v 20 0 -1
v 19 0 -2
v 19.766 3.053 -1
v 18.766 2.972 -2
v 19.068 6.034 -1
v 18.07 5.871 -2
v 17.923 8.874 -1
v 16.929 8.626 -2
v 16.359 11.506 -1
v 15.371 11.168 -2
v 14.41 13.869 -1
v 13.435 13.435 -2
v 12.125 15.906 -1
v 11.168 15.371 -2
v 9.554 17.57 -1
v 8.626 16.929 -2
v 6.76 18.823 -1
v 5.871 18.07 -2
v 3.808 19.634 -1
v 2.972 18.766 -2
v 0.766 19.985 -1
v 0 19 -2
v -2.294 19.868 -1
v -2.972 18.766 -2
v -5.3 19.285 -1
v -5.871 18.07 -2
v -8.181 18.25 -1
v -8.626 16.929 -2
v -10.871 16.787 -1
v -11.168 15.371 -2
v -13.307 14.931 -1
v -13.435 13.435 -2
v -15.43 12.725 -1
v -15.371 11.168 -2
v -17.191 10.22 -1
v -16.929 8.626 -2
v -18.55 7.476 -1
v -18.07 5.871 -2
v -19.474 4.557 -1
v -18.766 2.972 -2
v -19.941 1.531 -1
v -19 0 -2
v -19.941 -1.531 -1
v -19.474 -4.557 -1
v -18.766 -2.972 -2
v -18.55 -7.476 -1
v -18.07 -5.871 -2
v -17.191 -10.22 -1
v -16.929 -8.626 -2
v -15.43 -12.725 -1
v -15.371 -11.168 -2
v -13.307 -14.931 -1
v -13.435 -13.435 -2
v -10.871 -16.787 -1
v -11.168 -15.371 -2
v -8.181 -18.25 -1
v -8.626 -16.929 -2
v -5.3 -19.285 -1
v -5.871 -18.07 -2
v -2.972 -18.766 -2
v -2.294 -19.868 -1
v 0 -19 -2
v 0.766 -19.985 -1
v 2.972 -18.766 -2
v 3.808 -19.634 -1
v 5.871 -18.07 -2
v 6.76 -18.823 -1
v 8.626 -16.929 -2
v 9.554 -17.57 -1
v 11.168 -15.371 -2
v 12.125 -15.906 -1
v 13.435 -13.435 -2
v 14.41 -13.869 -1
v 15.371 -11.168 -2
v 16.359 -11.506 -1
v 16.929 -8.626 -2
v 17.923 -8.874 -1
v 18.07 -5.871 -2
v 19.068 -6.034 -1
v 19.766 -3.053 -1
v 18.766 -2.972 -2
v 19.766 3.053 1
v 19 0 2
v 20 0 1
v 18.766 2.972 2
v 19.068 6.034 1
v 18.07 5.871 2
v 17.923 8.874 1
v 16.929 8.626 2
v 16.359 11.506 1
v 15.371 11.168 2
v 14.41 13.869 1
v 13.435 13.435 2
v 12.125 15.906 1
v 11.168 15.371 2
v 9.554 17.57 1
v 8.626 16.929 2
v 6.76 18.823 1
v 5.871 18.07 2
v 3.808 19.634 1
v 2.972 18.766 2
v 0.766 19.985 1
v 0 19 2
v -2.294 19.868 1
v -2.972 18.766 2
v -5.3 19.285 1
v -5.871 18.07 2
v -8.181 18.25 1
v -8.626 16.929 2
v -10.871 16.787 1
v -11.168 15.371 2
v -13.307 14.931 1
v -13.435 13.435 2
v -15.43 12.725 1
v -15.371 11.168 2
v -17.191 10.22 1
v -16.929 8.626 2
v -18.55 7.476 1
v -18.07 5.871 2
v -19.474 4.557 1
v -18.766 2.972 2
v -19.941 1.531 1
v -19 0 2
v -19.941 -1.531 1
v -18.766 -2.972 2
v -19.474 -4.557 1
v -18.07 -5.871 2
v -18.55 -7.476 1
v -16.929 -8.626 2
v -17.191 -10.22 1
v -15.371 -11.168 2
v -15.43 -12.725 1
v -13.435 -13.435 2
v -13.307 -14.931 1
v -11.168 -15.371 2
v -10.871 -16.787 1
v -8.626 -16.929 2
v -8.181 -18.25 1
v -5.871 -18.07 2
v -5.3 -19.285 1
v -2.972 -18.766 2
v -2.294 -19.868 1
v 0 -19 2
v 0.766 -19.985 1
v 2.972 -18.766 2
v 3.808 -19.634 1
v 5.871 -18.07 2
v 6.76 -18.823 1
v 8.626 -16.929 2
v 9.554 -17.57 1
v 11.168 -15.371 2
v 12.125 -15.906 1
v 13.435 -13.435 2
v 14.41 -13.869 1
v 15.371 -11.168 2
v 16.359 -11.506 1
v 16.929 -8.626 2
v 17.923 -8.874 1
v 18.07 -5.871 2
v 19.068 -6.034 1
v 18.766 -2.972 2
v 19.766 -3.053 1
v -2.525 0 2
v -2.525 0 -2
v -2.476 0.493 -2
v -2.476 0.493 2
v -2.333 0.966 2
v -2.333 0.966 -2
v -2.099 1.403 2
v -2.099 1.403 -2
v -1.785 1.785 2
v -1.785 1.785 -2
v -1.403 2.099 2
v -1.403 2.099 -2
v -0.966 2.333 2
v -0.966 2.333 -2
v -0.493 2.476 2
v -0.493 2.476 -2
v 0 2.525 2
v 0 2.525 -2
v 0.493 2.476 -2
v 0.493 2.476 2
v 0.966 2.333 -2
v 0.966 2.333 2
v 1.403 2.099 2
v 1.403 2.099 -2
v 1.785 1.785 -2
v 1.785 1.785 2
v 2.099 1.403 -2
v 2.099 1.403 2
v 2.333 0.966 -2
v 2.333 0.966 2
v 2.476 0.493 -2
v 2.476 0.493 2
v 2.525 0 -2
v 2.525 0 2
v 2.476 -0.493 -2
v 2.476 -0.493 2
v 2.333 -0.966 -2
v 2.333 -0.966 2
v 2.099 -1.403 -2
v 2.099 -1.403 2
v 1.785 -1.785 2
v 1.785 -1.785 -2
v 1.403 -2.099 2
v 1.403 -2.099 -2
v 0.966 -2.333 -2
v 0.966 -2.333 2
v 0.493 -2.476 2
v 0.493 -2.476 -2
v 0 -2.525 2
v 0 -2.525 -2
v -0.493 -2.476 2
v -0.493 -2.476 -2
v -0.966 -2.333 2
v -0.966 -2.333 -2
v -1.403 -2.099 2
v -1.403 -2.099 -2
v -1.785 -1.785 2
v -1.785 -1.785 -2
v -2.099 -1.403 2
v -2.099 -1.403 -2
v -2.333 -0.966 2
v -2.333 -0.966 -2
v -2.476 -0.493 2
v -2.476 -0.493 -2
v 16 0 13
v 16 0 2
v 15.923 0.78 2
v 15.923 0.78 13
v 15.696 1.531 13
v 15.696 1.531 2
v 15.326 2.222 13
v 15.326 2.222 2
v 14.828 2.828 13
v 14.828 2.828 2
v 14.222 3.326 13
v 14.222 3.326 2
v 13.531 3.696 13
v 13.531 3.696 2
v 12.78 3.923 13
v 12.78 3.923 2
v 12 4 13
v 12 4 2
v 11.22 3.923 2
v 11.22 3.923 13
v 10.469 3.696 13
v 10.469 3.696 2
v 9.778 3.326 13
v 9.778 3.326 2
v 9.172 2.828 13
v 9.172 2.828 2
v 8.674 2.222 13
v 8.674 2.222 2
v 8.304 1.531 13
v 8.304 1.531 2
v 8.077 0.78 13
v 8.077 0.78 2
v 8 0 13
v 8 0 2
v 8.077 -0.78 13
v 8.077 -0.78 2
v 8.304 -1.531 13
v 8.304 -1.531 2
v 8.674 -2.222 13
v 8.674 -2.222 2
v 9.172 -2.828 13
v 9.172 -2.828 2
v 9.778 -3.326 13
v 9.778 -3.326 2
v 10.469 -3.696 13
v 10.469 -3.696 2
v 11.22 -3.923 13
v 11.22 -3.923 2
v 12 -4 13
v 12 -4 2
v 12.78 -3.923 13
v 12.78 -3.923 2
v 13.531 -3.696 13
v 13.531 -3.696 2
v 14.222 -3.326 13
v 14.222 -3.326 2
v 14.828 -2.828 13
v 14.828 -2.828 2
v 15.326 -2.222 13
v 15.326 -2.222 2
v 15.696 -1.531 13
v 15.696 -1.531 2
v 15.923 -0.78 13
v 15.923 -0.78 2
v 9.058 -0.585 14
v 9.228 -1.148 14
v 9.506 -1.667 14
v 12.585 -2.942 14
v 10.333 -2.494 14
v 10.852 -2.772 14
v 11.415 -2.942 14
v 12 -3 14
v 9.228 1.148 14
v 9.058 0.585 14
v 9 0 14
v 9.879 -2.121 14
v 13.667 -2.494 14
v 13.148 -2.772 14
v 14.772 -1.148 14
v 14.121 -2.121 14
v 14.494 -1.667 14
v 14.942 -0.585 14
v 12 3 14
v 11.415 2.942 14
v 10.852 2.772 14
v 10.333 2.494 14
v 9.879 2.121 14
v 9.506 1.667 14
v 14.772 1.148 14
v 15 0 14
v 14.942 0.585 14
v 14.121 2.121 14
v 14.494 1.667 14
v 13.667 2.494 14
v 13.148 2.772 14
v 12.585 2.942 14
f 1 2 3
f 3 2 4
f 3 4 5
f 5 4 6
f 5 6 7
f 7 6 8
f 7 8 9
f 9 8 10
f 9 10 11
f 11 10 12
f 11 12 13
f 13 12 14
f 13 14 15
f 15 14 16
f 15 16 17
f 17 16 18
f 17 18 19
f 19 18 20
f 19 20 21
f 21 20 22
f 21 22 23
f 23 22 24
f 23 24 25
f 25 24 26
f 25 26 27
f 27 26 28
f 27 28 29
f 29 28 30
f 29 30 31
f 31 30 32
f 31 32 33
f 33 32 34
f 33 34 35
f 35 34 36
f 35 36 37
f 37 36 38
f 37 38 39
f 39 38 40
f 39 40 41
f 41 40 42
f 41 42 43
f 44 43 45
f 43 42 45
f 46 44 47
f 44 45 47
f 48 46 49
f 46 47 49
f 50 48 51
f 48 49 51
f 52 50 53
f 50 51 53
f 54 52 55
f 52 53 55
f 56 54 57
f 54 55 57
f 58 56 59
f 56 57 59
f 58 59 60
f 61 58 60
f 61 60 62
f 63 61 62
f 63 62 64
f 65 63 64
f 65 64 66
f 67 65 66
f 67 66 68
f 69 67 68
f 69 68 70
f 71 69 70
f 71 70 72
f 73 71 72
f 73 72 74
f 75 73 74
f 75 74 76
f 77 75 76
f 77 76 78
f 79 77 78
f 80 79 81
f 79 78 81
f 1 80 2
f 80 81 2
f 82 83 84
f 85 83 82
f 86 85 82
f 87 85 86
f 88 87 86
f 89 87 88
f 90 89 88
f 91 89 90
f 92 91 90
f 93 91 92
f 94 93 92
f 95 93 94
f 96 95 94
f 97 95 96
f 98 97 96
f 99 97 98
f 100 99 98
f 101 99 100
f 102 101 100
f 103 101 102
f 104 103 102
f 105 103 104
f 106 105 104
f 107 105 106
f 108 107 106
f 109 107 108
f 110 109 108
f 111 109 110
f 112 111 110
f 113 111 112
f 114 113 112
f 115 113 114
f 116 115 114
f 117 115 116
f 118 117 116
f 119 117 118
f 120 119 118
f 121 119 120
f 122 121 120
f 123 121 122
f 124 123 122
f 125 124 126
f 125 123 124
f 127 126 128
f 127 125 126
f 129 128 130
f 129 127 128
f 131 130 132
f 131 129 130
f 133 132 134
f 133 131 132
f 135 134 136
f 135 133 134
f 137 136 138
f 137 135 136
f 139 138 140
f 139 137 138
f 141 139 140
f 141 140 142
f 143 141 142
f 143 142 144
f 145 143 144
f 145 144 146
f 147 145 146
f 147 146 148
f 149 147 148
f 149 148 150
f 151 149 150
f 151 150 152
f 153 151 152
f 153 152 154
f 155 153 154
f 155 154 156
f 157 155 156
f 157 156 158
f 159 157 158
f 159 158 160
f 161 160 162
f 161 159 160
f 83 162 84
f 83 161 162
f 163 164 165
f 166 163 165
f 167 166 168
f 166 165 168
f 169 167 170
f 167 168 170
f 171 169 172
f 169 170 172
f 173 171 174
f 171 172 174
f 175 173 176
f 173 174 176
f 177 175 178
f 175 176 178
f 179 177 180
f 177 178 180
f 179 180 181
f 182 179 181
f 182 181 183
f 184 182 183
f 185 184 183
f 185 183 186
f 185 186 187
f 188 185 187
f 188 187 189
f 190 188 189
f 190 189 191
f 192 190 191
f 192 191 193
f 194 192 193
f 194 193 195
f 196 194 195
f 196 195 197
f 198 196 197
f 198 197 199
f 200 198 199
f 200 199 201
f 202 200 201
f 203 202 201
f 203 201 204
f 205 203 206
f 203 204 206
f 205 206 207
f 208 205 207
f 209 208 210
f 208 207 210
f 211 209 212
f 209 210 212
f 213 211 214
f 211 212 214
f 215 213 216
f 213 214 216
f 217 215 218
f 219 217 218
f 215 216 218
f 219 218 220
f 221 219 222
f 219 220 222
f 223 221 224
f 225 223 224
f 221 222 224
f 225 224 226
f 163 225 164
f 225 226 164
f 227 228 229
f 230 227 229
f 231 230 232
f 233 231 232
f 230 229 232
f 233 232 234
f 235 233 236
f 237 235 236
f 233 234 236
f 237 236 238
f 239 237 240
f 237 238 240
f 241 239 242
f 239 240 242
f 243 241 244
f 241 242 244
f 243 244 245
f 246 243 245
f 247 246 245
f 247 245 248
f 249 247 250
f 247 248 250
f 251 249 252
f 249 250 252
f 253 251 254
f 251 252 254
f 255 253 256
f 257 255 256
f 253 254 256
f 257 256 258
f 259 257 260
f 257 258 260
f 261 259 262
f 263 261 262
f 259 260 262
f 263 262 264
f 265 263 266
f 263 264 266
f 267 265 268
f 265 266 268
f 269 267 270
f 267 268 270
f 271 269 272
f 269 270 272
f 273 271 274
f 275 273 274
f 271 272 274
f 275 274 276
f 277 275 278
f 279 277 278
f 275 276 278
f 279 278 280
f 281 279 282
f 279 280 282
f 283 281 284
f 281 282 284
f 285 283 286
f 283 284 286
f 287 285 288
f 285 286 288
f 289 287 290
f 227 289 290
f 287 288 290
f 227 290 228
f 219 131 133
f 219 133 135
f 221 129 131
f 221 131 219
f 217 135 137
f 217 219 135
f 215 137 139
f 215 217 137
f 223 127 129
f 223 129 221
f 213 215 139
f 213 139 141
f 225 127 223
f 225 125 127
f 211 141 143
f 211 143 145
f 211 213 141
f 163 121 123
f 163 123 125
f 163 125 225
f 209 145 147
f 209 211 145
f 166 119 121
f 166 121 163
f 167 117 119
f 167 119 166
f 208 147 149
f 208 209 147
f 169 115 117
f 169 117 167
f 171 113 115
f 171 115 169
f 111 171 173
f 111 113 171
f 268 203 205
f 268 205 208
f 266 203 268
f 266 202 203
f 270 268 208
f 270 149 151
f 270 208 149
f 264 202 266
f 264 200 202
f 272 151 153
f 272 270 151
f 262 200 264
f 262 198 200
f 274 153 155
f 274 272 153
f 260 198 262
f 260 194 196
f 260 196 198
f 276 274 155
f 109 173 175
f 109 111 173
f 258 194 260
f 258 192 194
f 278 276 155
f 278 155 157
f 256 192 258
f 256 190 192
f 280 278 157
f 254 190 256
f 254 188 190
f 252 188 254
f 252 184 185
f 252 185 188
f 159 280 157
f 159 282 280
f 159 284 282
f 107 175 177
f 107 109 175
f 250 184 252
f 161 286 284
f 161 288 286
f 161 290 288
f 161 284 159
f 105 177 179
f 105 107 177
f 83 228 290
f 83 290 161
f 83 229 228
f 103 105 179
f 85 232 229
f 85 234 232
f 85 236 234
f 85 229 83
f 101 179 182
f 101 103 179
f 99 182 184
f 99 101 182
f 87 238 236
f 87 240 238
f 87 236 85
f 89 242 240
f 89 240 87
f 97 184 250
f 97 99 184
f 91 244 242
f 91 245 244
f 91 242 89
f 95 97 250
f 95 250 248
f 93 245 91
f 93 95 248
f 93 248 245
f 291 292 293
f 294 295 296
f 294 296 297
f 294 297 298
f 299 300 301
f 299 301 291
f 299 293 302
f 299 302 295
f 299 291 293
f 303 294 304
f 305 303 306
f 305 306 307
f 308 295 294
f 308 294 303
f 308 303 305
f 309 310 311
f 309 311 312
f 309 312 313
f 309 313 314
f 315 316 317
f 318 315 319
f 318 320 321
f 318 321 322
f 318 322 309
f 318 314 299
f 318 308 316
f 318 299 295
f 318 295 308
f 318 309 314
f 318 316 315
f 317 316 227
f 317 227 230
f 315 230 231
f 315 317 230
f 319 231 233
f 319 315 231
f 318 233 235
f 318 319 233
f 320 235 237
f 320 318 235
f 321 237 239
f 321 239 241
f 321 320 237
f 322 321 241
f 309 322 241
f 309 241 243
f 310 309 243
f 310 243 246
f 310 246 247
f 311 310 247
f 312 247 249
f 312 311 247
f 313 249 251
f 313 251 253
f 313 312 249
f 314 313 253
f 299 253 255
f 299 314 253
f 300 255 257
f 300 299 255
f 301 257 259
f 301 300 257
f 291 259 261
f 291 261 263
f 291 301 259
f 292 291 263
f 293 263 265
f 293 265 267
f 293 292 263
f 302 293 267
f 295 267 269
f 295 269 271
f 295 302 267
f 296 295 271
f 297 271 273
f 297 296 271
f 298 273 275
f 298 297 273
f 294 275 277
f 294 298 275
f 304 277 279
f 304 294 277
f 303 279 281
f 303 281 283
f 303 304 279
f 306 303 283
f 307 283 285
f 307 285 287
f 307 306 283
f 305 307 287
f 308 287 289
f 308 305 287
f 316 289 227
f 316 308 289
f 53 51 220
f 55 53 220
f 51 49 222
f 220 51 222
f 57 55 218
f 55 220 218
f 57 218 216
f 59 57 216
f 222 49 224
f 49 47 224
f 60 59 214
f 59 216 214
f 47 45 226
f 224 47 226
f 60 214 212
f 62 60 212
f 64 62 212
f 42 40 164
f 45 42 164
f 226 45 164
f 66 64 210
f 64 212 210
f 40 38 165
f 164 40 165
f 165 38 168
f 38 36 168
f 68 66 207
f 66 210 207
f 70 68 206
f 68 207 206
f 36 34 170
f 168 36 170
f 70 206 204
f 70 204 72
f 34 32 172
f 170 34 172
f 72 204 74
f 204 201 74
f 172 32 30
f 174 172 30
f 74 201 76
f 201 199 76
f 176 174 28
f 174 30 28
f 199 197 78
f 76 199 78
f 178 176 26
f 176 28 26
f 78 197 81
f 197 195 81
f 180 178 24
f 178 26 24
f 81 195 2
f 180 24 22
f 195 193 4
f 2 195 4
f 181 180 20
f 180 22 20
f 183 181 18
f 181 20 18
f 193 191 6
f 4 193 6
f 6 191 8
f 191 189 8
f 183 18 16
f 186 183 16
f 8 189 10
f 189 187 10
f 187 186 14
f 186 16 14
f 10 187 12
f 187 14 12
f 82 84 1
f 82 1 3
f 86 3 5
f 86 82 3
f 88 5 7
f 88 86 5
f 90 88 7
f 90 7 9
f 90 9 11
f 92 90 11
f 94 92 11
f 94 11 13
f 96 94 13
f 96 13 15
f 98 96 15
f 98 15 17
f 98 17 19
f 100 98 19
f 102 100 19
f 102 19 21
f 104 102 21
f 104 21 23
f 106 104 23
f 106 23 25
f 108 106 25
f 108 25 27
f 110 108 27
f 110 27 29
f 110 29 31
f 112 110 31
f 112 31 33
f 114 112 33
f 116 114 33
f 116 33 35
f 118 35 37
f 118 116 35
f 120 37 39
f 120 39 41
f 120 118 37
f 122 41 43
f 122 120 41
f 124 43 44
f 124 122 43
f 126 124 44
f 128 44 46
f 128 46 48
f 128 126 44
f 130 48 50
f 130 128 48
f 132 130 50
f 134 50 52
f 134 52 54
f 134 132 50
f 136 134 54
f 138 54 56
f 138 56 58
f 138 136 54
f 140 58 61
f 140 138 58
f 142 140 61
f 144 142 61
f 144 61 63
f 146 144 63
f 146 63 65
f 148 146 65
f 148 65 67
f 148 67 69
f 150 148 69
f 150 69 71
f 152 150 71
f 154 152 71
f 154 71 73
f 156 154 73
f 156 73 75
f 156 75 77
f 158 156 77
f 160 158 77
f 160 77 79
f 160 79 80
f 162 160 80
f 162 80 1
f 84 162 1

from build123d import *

# Parameters (mm, degrees)
SKETCH1_R           = 20
BOSS_EXTRUDE1_DEPTH = 2
SKETCH2_R           = 4
BOSS_EXTRUDE2_DEPTH = 12
CUT_EXTRUDE1_REACH  = 34.496
SKETCH3_R           = 2.525
CHAMFER2_SIZE       = 1


with BuildPart() as part:
    # Sketch1 → Boss-Extrude1 (new, symmetric)
    with BuildSketch(Plane.XY):
        Circle(SKETCH1_R)
    extrude(amount=BOSS_EXTRUDE1_DEPTH, both=True)

    # Sketch2 → Boss-Extrude2 (add)
    with BuildSketch(Plane.XY.offset(2)):
        with Locations((12, 0)):
            Circle(SKETCH2_R)
    extrude(amount=BOSS_EXTRUDE2_DEPTH)

    # Sketch3 → Cut-Extrude1 (cut, up to next)
    with BuildSketch(Plane(origin=(0, 0, -2), x_dir=(-1, 0, 0), z_dir=(0, 0, -1)), mode=Mode.PRIVATE) as cut_extrude1_sk1:
        Circle(SKETCH3_R)
    cut_extrude1_tool1 = extrude(cut_extrude1_sk1.sketch, amount=-CUT_EXTRUDE1_REACH, mode=Mode.PRIVATE) & part.part
    add(cut_extrude1_tool1.solids().sort_by_distance((0, 0, -2))[0], mode=Mode.SUBTRACT)

    # Chamfer2
    chamfer2_edges = [part.edges().sort_by_distance(p)[0] for p in [
        (-20, 0, -2),
        (-20, 0, 2),
        (8, 0, 14),
    ]]
    chamfer(chamfer2_edges, length=CHAMFER2_SIZE)


solid = part.part
